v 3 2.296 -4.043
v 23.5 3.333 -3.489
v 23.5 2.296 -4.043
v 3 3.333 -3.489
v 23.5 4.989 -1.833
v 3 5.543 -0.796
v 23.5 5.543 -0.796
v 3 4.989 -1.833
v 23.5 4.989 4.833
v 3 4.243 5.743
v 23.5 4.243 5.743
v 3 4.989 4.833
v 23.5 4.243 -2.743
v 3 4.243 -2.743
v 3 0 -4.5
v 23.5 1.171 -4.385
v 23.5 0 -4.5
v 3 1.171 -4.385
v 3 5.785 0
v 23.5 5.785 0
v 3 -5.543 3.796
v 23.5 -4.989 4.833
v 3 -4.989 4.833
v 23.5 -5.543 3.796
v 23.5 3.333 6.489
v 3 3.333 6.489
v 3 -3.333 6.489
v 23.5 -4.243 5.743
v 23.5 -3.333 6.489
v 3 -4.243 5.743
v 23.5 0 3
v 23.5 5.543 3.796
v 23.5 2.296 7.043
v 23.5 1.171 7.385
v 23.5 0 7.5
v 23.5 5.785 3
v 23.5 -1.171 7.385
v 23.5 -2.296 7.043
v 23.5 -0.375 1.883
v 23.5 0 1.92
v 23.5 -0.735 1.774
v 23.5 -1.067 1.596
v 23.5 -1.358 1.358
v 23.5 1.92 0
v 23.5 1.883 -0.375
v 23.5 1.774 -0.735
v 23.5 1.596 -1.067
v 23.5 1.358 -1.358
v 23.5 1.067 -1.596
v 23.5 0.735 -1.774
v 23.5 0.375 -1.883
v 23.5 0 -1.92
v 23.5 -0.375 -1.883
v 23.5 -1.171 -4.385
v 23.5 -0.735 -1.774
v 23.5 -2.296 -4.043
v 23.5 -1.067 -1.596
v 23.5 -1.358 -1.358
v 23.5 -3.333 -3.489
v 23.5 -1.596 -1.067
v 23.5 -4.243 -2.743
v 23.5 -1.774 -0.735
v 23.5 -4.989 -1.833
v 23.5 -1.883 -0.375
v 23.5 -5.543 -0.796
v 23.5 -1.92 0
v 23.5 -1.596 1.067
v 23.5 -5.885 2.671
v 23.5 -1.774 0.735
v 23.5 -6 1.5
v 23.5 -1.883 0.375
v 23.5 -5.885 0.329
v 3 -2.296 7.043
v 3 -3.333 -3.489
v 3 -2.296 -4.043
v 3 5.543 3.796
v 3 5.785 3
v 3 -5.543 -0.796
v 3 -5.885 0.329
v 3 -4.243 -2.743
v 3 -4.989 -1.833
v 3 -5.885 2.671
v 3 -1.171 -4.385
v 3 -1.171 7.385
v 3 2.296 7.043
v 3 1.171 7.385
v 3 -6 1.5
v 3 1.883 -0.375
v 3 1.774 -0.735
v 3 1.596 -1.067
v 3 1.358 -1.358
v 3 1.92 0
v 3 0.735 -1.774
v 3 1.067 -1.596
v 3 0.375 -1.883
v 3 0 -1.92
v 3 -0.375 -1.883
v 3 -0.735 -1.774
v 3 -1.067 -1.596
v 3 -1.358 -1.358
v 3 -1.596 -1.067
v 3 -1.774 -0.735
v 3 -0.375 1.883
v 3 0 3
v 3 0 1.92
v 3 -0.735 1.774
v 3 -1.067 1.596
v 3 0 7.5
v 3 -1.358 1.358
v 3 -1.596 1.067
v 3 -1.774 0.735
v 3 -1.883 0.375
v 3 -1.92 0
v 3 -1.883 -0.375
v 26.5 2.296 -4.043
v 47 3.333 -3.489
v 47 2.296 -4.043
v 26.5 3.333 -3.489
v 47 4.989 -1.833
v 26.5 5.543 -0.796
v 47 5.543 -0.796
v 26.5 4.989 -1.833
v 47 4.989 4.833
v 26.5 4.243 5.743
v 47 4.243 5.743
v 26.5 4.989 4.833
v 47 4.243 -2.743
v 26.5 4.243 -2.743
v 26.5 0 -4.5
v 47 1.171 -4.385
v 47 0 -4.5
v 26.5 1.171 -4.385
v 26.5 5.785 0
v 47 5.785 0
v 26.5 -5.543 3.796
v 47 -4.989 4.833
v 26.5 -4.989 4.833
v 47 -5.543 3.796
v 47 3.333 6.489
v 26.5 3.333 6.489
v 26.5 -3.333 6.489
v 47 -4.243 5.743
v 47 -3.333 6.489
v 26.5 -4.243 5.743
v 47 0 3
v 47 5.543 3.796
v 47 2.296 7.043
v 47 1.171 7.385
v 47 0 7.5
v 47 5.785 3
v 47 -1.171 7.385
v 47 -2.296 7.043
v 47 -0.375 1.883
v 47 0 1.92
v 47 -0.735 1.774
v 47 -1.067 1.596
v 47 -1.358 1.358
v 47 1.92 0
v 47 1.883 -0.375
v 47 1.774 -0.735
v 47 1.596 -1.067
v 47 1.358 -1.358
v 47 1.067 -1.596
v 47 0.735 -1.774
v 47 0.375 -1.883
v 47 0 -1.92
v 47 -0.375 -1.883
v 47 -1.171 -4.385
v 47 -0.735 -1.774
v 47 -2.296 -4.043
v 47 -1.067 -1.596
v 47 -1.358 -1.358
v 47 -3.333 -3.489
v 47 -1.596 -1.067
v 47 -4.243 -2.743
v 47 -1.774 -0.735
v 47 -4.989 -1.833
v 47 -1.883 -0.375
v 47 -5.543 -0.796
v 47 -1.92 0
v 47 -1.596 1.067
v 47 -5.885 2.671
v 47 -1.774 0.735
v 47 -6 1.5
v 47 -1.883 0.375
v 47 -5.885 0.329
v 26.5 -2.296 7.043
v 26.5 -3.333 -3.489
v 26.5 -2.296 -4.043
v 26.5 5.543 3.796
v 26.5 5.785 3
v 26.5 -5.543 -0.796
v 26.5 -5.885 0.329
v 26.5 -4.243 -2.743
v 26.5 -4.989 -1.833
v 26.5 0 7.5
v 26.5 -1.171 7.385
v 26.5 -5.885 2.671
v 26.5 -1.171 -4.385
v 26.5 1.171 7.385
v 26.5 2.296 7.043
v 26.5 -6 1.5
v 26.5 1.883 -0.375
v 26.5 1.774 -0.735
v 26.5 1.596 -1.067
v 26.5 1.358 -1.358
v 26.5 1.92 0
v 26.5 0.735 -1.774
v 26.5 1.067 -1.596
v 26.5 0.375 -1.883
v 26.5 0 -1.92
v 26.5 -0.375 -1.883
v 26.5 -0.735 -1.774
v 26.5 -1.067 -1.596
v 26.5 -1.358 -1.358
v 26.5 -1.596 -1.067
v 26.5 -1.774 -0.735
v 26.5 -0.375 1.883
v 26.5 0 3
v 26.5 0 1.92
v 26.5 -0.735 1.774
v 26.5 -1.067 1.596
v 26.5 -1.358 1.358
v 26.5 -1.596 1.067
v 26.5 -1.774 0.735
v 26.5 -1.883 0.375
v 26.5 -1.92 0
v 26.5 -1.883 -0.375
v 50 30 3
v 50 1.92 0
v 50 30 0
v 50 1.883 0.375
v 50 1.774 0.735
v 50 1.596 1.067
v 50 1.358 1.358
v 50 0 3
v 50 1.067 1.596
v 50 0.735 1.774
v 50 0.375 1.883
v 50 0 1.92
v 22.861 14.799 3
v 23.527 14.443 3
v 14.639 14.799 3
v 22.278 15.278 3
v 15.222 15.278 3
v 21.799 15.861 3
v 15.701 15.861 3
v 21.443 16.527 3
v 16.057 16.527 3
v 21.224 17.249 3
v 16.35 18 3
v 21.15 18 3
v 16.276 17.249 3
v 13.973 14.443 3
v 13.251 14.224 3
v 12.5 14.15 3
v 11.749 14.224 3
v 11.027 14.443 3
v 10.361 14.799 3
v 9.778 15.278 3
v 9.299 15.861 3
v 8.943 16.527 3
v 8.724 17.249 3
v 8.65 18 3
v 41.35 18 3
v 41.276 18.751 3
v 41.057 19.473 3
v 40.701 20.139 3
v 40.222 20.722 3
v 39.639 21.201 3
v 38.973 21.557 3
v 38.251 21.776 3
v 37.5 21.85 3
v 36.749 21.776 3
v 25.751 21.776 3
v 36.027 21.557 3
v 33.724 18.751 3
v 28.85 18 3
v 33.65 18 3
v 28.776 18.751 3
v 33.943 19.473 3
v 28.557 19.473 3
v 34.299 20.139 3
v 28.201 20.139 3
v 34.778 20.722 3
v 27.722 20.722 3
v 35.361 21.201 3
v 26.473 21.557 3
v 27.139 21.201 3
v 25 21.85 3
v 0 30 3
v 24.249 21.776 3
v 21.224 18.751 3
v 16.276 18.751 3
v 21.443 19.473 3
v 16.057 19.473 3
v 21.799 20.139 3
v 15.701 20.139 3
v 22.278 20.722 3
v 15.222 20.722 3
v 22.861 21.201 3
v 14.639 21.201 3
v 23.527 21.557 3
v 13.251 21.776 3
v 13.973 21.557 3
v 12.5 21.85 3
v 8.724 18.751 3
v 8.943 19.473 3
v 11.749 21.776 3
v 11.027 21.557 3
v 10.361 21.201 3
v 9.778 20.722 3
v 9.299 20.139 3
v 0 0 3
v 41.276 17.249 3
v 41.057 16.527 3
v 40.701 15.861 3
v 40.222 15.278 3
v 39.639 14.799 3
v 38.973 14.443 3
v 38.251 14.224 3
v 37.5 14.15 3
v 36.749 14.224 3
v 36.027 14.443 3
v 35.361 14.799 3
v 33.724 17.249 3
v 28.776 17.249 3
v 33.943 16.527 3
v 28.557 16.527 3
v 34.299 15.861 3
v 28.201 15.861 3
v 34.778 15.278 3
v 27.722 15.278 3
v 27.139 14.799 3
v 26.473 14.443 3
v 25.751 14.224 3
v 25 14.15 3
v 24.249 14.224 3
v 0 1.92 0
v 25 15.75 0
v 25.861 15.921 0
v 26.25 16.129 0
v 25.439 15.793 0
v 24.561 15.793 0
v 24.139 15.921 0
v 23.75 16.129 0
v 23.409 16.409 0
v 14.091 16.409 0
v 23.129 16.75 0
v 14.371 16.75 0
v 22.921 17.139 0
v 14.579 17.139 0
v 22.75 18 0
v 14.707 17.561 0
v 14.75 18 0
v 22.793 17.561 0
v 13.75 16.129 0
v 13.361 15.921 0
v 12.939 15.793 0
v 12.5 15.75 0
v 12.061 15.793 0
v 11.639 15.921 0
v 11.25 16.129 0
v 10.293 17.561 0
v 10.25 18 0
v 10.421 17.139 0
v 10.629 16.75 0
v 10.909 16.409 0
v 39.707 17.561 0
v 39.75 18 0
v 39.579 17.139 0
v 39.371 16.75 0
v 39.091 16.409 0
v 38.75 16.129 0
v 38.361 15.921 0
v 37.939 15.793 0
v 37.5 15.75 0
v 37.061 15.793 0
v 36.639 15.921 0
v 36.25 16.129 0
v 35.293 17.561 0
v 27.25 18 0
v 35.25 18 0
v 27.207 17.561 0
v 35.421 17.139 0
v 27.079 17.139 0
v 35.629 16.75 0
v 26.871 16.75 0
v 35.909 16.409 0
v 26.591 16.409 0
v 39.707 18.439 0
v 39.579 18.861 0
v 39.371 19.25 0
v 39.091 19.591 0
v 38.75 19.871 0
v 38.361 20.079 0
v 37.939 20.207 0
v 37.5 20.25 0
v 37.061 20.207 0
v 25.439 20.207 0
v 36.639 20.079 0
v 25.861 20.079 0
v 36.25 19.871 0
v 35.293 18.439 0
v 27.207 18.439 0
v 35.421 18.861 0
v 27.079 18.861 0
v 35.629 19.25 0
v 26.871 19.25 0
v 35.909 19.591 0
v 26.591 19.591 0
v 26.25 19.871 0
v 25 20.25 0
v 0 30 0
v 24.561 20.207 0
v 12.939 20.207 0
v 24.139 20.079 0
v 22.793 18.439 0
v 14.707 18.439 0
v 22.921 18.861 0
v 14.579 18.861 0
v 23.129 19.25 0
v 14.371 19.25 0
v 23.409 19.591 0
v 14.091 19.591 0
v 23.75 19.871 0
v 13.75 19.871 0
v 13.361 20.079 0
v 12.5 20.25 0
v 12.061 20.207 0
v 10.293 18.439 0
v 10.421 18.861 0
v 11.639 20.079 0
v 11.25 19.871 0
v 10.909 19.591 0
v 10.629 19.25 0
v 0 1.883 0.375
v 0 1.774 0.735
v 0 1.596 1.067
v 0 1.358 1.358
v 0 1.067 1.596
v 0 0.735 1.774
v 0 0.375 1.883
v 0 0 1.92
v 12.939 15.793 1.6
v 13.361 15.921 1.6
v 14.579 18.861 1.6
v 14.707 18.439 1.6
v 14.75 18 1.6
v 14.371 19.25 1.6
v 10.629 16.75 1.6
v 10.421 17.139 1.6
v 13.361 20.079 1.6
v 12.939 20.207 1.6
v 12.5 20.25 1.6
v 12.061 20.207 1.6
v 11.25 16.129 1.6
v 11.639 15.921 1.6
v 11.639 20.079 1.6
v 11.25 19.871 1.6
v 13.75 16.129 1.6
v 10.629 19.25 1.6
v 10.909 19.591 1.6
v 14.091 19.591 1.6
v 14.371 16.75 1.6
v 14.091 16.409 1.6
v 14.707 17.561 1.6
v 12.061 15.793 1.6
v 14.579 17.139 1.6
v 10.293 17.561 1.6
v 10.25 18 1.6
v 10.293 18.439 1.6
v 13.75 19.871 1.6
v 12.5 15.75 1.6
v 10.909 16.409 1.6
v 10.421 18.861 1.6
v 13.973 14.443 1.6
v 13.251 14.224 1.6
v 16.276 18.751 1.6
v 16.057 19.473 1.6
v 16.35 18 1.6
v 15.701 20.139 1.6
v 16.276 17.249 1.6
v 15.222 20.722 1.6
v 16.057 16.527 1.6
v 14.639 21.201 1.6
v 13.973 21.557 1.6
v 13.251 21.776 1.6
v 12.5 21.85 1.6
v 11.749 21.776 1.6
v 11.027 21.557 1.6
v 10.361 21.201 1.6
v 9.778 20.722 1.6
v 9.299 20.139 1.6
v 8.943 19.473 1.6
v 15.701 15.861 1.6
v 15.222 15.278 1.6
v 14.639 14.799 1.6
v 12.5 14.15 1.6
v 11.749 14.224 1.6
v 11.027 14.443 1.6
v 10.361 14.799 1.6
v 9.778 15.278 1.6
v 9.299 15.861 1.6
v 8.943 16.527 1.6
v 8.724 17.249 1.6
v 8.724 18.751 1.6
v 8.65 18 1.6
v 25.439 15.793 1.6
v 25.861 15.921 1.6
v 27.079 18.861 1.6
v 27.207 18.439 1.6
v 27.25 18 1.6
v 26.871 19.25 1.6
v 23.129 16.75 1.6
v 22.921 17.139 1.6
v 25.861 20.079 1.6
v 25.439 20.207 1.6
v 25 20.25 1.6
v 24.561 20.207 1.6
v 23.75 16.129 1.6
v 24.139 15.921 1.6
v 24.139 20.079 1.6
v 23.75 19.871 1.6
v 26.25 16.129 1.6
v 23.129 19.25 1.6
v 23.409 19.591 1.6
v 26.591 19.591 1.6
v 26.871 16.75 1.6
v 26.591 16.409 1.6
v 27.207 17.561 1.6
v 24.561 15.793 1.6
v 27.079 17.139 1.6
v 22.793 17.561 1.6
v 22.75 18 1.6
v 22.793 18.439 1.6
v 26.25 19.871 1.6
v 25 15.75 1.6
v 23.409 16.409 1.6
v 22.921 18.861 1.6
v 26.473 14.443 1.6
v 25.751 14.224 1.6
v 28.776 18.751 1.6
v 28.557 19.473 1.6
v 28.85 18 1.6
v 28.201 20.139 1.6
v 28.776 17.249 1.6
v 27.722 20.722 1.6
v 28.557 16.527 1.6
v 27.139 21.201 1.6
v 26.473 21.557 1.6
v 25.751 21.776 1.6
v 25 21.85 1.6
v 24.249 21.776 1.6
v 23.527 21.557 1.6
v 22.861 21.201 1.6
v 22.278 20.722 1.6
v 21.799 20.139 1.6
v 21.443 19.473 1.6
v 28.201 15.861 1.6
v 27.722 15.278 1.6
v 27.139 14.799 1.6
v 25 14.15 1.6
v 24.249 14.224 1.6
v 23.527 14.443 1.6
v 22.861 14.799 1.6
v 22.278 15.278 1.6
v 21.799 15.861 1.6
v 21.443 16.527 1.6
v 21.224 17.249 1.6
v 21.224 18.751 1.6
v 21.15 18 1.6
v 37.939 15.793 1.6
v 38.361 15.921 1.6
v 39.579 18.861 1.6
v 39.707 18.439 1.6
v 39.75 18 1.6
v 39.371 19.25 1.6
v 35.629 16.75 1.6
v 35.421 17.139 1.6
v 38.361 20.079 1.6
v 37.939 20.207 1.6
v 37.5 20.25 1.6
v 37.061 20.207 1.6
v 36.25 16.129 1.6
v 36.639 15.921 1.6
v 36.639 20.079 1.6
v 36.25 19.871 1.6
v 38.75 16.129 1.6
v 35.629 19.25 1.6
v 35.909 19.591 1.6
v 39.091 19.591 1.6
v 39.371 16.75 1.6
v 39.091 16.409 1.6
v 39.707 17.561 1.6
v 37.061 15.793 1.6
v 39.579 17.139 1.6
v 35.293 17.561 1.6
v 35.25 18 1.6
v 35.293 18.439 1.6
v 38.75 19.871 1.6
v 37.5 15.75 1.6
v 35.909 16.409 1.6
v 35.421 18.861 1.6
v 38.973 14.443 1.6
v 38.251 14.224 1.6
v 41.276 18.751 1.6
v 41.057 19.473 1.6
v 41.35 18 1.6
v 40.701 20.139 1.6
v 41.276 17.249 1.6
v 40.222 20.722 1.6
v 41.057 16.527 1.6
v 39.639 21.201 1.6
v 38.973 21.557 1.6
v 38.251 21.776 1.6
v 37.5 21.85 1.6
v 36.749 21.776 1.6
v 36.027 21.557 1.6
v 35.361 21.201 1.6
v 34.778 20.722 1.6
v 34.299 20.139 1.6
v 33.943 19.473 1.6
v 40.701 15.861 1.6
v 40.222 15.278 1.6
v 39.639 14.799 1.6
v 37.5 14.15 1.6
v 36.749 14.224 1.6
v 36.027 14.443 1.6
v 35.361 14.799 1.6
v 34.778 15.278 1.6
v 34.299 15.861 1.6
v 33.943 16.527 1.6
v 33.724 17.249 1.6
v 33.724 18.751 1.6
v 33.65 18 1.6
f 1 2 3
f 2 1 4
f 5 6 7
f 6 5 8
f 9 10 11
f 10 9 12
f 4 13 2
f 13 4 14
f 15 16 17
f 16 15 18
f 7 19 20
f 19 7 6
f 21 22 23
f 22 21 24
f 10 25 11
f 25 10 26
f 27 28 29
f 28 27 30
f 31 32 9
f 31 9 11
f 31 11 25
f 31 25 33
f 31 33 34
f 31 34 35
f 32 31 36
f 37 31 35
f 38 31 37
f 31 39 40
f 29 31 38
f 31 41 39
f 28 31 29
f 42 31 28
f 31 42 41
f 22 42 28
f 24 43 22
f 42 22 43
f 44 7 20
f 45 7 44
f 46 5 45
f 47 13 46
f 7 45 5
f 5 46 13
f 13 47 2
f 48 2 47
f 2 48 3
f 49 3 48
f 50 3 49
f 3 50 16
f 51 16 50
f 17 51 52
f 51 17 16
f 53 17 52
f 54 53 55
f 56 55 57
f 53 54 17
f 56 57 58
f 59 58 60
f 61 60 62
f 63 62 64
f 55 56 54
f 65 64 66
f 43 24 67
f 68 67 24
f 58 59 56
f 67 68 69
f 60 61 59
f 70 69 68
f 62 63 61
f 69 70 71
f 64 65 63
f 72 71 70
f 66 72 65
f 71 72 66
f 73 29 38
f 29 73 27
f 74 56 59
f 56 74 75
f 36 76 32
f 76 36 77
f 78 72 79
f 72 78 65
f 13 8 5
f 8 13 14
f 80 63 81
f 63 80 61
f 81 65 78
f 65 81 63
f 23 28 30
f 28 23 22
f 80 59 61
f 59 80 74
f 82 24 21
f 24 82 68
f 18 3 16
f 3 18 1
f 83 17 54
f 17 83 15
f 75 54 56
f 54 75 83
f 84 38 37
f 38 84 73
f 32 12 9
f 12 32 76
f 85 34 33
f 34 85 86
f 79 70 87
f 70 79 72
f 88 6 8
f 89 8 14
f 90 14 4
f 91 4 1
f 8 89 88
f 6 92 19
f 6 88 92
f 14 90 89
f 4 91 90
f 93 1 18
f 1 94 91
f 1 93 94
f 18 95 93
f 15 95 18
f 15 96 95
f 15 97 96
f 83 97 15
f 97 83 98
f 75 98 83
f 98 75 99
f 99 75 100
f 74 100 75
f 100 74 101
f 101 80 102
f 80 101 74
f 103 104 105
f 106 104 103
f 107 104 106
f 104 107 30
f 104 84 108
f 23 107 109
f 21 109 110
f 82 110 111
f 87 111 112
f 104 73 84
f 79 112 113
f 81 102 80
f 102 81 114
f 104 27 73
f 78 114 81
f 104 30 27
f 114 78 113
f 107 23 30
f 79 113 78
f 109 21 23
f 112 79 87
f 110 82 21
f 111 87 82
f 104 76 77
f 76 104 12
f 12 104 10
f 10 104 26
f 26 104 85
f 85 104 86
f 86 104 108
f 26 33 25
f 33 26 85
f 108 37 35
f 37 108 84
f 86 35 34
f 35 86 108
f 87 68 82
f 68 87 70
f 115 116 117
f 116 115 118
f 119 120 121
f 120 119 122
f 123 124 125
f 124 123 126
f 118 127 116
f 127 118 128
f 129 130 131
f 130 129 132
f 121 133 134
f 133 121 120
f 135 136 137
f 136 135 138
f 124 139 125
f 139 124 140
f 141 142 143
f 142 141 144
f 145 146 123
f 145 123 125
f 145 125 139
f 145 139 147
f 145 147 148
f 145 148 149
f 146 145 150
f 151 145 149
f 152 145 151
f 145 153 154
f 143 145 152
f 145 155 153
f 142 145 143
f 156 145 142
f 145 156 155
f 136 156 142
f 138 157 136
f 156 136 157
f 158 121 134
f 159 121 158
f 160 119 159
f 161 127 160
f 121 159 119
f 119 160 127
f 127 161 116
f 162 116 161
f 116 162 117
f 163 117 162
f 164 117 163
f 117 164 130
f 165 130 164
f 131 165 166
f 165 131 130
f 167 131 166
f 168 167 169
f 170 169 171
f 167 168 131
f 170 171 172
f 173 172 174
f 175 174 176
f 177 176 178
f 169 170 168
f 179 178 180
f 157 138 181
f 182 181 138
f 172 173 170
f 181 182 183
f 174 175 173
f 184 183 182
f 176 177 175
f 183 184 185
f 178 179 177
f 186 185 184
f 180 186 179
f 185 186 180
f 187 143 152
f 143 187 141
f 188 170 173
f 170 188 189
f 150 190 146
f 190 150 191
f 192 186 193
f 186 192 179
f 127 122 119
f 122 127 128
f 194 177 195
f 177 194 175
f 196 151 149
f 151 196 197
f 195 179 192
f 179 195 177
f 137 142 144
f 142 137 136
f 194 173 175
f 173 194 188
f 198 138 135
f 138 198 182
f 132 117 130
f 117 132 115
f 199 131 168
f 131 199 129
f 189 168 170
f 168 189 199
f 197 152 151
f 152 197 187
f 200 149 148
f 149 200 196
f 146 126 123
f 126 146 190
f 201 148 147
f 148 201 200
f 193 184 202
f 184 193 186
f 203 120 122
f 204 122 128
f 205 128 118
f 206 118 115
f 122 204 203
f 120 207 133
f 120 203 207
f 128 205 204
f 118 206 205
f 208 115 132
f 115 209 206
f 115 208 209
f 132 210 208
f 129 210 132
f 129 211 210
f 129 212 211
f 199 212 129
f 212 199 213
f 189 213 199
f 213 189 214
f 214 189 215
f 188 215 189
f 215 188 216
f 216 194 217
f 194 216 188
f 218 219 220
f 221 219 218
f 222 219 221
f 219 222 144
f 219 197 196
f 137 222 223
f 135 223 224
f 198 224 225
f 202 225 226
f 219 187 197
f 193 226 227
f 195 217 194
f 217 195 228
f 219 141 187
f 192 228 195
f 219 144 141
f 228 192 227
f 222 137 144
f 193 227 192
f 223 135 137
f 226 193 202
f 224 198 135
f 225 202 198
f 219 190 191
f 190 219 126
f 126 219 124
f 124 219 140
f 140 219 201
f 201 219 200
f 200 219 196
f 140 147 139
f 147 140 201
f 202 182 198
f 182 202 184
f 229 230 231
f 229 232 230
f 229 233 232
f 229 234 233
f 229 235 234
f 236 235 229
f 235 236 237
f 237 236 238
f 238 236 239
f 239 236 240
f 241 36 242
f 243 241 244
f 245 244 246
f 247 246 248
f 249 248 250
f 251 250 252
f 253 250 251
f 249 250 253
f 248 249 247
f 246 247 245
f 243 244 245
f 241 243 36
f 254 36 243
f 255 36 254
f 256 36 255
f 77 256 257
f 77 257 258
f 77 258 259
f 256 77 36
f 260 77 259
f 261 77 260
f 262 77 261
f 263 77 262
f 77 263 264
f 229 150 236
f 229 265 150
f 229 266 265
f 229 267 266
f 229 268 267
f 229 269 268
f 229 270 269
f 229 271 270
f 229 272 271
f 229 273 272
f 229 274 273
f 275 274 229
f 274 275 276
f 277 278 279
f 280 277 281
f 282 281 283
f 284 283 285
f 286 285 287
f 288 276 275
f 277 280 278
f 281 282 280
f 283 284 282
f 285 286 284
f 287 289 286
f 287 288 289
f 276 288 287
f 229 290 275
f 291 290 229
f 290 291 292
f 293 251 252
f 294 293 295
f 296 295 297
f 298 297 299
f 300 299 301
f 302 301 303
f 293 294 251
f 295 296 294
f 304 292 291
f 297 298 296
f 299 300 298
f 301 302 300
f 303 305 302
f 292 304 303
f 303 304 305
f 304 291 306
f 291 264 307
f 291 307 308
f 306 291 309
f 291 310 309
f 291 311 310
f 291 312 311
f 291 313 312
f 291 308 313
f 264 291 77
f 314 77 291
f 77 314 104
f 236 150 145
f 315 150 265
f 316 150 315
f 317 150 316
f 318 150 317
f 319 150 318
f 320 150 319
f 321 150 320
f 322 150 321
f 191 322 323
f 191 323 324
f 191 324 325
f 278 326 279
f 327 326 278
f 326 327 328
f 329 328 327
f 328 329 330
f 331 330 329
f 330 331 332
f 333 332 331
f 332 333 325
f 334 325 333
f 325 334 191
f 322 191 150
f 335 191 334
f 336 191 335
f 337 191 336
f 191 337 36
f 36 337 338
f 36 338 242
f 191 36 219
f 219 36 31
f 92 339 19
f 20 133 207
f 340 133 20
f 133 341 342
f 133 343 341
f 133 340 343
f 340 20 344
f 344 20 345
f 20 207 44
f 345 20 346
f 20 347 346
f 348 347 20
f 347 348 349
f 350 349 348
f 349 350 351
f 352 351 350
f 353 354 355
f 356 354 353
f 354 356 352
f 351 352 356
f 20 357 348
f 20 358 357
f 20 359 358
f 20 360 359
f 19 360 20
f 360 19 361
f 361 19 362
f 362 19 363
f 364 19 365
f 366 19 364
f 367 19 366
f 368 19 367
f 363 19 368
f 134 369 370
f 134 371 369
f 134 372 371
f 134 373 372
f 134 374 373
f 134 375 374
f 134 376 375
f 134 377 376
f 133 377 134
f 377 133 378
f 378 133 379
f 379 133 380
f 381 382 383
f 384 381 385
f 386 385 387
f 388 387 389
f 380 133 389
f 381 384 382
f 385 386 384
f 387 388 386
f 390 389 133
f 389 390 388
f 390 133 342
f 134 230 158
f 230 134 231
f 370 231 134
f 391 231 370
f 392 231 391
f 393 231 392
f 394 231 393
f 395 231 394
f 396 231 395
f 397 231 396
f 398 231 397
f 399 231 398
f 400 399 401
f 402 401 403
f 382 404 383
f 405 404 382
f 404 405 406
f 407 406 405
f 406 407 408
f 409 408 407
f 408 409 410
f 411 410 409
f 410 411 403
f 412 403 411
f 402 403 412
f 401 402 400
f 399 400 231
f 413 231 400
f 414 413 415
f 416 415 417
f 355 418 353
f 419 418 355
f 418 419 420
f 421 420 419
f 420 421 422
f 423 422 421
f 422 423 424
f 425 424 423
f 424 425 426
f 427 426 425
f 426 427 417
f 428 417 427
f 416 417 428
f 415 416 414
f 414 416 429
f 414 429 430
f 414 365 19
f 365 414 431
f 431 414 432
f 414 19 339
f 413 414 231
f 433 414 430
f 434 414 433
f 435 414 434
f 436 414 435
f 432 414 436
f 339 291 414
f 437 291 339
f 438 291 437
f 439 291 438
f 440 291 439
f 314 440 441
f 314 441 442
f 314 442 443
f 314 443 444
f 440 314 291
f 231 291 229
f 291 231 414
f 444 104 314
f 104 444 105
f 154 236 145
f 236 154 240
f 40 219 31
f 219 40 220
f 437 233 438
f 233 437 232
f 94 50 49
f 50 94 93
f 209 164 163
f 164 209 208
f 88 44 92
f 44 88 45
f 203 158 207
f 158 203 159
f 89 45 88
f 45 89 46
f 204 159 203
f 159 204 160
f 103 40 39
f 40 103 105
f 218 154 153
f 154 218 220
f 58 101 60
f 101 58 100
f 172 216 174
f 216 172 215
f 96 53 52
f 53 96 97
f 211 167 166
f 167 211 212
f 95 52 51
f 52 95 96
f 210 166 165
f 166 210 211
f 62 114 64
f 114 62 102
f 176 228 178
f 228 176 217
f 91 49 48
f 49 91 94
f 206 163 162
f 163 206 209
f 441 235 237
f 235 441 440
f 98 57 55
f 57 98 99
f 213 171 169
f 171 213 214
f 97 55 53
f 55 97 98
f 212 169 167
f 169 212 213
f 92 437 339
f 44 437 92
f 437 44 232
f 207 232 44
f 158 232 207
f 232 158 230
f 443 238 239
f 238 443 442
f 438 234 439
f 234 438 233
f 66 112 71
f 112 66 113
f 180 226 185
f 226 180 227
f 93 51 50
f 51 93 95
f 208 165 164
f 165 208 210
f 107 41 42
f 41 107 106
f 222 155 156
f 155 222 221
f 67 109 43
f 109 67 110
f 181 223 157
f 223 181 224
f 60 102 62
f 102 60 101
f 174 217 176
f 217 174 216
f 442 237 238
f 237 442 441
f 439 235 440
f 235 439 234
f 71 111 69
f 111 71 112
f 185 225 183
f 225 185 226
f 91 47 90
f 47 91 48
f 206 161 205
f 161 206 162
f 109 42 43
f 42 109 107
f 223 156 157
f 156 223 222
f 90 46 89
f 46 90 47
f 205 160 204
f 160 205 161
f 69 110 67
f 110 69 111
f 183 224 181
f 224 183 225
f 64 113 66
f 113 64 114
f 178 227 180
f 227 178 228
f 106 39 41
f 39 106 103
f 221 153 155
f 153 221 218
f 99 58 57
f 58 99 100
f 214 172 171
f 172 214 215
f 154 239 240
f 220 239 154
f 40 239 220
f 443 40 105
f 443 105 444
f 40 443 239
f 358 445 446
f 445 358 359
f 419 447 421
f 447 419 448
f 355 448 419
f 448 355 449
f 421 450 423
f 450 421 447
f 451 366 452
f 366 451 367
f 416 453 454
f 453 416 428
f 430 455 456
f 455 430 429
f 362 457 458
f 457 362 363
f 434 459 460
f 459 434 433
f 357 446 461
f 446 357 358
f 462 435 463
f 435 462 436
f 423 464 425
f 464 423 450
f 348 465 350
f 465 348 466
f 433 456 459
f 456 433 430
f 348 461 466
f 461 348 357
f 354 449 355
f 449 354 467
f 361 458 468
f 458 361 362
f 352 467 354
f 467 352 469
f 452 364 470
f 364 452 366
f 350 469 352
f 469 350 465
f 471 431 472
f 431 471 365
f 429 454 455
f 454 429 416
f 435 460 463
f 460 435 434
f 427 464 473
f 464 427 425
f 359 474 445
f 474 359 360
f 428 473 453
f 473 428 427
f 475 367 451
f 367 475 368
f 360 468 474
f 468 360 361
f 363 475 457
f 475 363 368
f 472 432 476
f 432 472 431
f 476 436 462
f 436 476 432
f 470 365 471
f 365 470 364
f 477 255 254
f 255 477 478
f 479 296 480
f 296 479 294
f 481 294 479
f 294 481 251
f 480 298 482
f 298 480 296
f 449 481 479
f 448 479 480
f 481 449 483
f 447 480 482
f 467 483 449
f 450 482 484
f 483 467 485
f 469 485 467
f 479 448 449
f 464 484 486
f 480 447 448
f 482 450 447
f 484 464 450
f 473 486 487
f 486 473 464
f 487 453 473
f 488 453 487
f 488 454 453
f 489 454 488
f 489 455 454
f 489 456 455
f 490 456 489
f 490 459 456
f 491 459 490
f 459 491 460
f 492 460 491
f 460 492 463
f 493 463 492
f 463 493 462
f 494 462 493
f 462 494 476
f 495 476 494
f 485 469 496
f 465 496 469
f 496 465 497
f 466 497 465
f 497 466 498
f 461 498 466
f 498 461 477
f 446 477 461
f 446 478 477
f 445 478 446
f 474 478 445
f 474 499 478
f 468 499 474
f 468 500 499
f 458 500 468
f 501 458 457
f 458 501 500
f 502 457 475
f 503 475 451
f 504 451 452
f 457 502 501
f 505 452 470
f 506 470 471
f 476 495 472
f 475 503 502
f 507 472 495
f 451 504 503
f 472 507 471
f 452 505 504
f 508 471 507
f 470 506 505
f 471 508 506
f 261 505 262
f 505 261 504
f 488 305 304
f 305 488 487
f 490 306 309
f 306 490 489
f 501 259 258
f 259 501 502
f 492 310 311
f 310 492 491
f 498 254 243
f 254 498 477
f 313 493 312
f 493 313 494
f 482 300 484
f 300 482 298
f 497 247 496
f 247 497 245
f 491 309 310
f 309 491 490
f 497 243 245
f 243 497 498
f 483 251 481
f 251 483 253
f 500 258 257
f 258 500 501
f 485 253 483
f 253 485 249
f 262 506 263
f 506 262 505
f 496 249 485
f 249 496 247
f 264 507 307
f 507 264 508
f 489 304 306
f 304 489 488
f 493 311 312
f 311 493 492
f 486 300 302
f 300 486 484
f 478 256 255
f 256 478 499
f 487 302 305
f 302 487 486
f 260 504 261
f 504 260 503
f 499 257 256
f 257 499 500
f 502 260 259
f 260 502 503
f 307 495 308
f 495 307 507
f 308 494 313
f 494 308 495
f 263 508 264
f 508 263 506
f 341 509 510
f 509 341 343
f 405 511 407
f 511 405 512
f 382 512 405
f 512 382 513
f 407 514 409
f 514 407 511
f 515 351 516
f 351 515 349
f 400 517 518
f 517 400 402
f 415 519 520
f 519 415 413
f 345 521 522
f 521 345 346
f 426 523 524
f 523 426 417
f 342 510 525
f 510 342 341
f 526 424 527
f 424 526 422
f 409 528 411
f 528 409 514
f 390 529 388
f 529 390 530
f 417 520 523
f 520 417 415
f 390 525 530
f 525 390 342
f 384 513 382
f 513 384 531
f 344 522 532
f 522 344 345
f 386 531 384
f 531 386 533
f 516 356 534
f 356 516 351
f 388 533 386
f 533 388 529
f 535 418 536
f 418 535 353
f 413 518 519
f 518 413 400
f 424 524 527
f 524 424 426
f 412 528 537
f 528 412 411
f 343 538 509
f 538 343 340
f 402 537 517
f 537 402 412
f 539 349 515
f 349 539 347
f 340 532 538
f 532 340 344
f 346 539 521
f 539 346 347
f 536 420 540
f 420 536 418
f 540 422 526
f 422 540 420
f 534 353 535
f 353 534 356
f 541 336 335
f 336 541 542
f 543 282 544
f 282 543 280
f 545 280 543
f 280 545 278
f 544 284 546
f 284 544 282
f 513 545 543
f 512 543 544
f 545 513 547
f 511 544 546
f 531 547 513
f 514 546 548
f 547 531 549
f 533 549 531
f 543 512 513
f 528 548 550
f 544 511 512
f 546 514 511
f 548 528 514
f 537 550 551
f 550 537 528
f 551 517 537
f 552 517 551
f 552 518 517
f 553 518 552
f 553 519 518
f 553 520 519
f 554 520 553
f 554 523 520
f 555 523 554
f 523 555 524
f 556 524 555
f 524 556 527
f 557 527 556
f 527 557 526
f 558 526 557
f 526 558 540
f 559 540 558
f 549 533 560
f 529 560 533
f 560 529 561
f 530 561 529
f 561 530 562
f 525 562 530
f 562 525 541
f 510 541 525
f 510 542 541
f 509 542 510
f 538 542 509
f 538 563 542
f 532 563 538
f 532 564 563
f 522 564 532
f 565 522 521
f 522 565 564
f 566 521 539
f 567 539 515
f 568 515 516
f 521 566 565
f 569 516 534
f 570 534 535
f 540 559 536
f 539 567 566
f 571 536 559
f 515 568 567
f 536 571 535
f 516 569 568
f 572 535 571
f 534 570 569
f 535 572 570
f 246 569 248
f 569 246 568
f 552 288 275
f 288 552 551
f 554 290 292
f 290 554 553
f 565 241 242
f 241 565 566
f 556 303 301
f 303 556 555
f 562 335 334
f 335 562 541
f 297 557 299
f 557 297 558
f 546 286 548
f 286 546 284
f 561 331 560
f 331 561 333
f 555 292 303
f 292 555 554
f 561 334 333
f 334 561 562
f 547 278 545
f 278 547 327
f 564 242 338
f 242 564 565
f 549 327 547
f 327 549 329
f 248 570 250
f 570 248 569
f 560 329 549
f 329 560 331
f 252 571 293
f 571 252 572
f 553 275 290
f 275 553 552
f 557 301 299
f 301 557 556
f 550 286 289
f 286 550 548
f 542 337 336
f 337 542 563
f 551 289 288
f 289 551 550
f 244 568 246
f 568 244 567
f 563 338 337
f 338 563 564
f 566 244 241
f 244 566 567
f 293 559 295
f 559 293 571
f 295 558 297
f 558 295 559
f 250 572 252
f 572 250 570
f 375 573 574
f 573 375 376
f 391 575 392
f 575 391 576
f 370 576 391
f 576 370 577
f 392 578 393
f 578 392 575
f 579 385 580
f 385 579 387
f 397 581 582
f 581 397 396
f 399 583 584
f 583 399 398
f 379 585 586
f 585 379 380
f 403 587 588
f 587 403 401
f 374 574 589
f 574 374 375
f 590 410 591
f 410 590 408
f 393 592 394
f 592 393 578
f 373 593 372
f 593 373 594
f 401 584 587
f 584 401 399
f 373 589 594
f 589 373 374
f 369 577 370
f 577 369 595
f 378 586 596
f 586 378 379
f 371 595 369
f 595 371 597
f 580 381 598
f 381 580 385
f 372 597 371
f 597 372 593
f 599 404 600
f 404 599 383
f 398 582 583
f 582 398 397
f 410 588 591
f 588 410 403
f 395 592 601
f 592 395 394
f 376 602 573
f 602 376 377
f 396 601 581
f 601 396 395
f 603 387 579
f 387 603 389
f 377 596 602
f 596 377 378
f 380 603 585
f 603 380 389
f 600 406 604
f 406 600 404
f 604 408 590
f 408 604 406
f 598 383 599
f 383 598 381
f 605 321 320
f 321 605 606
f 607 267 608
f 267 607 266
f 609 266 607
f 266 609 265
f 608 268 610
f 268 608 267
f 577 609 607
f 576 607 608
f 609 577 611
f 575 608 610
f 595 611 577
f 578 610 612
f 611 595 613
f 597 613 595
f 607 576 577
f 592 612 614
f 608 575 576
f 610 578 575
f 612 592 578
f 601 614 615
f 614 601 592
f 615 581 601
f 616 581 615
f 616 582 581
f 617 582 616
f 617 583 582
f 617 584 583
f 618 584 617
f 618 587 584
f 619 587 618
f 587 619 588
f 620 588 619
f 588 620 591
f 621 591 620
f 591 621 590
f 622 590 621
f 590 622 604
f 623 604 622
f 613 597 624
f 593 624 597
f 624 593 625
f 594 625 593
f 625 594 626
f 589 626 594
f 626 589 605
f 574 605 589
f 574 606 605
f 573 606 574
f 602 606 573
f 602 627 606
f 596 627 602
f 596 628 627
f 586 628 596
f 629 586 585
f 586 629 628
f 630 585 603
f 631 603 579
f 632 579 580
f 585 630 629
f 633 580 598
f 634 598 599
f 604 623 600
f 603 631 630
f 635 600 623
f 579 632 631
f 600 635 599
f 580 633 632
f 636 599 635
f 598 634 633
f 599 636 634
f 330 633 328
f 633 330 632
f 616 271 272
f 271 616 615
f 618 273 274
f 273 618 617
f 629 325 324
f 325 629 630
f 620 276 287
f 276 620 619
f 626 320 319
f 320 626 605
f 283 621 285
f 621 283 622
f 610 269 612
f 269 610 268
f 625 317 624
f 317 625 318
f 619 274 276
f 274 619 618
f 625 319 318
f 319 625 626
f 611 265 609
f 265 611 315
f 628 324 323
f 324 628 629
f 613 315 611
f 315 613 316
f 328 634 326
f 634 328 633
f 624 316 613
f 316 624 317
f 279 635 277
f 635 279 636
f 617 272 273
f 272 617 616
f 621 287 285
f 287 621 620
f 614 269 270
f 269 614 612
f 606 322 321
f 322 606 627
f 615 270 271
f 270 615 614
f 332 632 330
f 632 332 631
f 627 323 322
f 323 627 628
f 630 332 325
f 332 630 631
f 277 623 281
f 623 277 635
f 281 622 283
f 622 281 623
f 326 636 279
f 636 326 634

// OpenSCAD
$fn = 32;

// ----------------------------------------------------------------------
// Hinge leaf: 50 x 36 x 12 mm
// ----------------------------------------------------------------------

// --- parameters (mm) ---
tab_len = 50;             // leaf length, X
tab_w = 30;               // leaf width, Y
tab_t = 3;                // leaf thickness
ring_d = 12;              // knuckle diameter
ring_w = 20.5;            // knuckle width
knuckle_n = 2;            // number of knuckles
pin_d = 3.84;             // pin bore
gap = 3;                  // gap between the knuckles
screw_d = 4.5;            // screw clearance
cs_d = 7.7;               // countersink diameter
cs_h = 1.4;               // countersink depth

module leaf() {
  cube([tab_len, tab_w, tab_t]);
}

module knuckles() {
  /* barrels sit on the leaf edge, the pin axis at half the leaf thickness */
  for (i = [0 : knuckle_n - 1])
    translate([gap + i * (ring_w + gap), 0, tab_t * 0.5])
      rotate([0, 90, 0]) cylinder(h = ring_w, d = ring_d);
}

difference() {
  union() {
    leaf();
    knuckles();
  }
  rotate([0, 90, 0]) translate([0, 0, -1])
    cylinder(h = tab_len + 2, d = pin_d);
  translate([12.5, tab_w * 0.6, -1]) cylinder(h = tab_t + 2, d = screw_d);
  translate([12.5, tab_w * 0.6, tab_t - cs_h]) cylinder(h = cs_h + 0.5, d = cs_d);
  translate([25, tab_w * 0.6, -1]) cylinder(h = tab_t + 2, d = screw_d);
  translate([25, tab_w * 0.6, tab_t - cs_h]) cylinder(h = cs_h + 0.5, d = cs_d);
  translate([37.5, tab_w * 0.6, -1]) cylinder(h = tab_t + 2, d = screw_d);
  translate([37.5, tab_w * 0.6, tab_t - cs_h]) cylinder(h = cs_h + 0.5, d = cs_d);
}
